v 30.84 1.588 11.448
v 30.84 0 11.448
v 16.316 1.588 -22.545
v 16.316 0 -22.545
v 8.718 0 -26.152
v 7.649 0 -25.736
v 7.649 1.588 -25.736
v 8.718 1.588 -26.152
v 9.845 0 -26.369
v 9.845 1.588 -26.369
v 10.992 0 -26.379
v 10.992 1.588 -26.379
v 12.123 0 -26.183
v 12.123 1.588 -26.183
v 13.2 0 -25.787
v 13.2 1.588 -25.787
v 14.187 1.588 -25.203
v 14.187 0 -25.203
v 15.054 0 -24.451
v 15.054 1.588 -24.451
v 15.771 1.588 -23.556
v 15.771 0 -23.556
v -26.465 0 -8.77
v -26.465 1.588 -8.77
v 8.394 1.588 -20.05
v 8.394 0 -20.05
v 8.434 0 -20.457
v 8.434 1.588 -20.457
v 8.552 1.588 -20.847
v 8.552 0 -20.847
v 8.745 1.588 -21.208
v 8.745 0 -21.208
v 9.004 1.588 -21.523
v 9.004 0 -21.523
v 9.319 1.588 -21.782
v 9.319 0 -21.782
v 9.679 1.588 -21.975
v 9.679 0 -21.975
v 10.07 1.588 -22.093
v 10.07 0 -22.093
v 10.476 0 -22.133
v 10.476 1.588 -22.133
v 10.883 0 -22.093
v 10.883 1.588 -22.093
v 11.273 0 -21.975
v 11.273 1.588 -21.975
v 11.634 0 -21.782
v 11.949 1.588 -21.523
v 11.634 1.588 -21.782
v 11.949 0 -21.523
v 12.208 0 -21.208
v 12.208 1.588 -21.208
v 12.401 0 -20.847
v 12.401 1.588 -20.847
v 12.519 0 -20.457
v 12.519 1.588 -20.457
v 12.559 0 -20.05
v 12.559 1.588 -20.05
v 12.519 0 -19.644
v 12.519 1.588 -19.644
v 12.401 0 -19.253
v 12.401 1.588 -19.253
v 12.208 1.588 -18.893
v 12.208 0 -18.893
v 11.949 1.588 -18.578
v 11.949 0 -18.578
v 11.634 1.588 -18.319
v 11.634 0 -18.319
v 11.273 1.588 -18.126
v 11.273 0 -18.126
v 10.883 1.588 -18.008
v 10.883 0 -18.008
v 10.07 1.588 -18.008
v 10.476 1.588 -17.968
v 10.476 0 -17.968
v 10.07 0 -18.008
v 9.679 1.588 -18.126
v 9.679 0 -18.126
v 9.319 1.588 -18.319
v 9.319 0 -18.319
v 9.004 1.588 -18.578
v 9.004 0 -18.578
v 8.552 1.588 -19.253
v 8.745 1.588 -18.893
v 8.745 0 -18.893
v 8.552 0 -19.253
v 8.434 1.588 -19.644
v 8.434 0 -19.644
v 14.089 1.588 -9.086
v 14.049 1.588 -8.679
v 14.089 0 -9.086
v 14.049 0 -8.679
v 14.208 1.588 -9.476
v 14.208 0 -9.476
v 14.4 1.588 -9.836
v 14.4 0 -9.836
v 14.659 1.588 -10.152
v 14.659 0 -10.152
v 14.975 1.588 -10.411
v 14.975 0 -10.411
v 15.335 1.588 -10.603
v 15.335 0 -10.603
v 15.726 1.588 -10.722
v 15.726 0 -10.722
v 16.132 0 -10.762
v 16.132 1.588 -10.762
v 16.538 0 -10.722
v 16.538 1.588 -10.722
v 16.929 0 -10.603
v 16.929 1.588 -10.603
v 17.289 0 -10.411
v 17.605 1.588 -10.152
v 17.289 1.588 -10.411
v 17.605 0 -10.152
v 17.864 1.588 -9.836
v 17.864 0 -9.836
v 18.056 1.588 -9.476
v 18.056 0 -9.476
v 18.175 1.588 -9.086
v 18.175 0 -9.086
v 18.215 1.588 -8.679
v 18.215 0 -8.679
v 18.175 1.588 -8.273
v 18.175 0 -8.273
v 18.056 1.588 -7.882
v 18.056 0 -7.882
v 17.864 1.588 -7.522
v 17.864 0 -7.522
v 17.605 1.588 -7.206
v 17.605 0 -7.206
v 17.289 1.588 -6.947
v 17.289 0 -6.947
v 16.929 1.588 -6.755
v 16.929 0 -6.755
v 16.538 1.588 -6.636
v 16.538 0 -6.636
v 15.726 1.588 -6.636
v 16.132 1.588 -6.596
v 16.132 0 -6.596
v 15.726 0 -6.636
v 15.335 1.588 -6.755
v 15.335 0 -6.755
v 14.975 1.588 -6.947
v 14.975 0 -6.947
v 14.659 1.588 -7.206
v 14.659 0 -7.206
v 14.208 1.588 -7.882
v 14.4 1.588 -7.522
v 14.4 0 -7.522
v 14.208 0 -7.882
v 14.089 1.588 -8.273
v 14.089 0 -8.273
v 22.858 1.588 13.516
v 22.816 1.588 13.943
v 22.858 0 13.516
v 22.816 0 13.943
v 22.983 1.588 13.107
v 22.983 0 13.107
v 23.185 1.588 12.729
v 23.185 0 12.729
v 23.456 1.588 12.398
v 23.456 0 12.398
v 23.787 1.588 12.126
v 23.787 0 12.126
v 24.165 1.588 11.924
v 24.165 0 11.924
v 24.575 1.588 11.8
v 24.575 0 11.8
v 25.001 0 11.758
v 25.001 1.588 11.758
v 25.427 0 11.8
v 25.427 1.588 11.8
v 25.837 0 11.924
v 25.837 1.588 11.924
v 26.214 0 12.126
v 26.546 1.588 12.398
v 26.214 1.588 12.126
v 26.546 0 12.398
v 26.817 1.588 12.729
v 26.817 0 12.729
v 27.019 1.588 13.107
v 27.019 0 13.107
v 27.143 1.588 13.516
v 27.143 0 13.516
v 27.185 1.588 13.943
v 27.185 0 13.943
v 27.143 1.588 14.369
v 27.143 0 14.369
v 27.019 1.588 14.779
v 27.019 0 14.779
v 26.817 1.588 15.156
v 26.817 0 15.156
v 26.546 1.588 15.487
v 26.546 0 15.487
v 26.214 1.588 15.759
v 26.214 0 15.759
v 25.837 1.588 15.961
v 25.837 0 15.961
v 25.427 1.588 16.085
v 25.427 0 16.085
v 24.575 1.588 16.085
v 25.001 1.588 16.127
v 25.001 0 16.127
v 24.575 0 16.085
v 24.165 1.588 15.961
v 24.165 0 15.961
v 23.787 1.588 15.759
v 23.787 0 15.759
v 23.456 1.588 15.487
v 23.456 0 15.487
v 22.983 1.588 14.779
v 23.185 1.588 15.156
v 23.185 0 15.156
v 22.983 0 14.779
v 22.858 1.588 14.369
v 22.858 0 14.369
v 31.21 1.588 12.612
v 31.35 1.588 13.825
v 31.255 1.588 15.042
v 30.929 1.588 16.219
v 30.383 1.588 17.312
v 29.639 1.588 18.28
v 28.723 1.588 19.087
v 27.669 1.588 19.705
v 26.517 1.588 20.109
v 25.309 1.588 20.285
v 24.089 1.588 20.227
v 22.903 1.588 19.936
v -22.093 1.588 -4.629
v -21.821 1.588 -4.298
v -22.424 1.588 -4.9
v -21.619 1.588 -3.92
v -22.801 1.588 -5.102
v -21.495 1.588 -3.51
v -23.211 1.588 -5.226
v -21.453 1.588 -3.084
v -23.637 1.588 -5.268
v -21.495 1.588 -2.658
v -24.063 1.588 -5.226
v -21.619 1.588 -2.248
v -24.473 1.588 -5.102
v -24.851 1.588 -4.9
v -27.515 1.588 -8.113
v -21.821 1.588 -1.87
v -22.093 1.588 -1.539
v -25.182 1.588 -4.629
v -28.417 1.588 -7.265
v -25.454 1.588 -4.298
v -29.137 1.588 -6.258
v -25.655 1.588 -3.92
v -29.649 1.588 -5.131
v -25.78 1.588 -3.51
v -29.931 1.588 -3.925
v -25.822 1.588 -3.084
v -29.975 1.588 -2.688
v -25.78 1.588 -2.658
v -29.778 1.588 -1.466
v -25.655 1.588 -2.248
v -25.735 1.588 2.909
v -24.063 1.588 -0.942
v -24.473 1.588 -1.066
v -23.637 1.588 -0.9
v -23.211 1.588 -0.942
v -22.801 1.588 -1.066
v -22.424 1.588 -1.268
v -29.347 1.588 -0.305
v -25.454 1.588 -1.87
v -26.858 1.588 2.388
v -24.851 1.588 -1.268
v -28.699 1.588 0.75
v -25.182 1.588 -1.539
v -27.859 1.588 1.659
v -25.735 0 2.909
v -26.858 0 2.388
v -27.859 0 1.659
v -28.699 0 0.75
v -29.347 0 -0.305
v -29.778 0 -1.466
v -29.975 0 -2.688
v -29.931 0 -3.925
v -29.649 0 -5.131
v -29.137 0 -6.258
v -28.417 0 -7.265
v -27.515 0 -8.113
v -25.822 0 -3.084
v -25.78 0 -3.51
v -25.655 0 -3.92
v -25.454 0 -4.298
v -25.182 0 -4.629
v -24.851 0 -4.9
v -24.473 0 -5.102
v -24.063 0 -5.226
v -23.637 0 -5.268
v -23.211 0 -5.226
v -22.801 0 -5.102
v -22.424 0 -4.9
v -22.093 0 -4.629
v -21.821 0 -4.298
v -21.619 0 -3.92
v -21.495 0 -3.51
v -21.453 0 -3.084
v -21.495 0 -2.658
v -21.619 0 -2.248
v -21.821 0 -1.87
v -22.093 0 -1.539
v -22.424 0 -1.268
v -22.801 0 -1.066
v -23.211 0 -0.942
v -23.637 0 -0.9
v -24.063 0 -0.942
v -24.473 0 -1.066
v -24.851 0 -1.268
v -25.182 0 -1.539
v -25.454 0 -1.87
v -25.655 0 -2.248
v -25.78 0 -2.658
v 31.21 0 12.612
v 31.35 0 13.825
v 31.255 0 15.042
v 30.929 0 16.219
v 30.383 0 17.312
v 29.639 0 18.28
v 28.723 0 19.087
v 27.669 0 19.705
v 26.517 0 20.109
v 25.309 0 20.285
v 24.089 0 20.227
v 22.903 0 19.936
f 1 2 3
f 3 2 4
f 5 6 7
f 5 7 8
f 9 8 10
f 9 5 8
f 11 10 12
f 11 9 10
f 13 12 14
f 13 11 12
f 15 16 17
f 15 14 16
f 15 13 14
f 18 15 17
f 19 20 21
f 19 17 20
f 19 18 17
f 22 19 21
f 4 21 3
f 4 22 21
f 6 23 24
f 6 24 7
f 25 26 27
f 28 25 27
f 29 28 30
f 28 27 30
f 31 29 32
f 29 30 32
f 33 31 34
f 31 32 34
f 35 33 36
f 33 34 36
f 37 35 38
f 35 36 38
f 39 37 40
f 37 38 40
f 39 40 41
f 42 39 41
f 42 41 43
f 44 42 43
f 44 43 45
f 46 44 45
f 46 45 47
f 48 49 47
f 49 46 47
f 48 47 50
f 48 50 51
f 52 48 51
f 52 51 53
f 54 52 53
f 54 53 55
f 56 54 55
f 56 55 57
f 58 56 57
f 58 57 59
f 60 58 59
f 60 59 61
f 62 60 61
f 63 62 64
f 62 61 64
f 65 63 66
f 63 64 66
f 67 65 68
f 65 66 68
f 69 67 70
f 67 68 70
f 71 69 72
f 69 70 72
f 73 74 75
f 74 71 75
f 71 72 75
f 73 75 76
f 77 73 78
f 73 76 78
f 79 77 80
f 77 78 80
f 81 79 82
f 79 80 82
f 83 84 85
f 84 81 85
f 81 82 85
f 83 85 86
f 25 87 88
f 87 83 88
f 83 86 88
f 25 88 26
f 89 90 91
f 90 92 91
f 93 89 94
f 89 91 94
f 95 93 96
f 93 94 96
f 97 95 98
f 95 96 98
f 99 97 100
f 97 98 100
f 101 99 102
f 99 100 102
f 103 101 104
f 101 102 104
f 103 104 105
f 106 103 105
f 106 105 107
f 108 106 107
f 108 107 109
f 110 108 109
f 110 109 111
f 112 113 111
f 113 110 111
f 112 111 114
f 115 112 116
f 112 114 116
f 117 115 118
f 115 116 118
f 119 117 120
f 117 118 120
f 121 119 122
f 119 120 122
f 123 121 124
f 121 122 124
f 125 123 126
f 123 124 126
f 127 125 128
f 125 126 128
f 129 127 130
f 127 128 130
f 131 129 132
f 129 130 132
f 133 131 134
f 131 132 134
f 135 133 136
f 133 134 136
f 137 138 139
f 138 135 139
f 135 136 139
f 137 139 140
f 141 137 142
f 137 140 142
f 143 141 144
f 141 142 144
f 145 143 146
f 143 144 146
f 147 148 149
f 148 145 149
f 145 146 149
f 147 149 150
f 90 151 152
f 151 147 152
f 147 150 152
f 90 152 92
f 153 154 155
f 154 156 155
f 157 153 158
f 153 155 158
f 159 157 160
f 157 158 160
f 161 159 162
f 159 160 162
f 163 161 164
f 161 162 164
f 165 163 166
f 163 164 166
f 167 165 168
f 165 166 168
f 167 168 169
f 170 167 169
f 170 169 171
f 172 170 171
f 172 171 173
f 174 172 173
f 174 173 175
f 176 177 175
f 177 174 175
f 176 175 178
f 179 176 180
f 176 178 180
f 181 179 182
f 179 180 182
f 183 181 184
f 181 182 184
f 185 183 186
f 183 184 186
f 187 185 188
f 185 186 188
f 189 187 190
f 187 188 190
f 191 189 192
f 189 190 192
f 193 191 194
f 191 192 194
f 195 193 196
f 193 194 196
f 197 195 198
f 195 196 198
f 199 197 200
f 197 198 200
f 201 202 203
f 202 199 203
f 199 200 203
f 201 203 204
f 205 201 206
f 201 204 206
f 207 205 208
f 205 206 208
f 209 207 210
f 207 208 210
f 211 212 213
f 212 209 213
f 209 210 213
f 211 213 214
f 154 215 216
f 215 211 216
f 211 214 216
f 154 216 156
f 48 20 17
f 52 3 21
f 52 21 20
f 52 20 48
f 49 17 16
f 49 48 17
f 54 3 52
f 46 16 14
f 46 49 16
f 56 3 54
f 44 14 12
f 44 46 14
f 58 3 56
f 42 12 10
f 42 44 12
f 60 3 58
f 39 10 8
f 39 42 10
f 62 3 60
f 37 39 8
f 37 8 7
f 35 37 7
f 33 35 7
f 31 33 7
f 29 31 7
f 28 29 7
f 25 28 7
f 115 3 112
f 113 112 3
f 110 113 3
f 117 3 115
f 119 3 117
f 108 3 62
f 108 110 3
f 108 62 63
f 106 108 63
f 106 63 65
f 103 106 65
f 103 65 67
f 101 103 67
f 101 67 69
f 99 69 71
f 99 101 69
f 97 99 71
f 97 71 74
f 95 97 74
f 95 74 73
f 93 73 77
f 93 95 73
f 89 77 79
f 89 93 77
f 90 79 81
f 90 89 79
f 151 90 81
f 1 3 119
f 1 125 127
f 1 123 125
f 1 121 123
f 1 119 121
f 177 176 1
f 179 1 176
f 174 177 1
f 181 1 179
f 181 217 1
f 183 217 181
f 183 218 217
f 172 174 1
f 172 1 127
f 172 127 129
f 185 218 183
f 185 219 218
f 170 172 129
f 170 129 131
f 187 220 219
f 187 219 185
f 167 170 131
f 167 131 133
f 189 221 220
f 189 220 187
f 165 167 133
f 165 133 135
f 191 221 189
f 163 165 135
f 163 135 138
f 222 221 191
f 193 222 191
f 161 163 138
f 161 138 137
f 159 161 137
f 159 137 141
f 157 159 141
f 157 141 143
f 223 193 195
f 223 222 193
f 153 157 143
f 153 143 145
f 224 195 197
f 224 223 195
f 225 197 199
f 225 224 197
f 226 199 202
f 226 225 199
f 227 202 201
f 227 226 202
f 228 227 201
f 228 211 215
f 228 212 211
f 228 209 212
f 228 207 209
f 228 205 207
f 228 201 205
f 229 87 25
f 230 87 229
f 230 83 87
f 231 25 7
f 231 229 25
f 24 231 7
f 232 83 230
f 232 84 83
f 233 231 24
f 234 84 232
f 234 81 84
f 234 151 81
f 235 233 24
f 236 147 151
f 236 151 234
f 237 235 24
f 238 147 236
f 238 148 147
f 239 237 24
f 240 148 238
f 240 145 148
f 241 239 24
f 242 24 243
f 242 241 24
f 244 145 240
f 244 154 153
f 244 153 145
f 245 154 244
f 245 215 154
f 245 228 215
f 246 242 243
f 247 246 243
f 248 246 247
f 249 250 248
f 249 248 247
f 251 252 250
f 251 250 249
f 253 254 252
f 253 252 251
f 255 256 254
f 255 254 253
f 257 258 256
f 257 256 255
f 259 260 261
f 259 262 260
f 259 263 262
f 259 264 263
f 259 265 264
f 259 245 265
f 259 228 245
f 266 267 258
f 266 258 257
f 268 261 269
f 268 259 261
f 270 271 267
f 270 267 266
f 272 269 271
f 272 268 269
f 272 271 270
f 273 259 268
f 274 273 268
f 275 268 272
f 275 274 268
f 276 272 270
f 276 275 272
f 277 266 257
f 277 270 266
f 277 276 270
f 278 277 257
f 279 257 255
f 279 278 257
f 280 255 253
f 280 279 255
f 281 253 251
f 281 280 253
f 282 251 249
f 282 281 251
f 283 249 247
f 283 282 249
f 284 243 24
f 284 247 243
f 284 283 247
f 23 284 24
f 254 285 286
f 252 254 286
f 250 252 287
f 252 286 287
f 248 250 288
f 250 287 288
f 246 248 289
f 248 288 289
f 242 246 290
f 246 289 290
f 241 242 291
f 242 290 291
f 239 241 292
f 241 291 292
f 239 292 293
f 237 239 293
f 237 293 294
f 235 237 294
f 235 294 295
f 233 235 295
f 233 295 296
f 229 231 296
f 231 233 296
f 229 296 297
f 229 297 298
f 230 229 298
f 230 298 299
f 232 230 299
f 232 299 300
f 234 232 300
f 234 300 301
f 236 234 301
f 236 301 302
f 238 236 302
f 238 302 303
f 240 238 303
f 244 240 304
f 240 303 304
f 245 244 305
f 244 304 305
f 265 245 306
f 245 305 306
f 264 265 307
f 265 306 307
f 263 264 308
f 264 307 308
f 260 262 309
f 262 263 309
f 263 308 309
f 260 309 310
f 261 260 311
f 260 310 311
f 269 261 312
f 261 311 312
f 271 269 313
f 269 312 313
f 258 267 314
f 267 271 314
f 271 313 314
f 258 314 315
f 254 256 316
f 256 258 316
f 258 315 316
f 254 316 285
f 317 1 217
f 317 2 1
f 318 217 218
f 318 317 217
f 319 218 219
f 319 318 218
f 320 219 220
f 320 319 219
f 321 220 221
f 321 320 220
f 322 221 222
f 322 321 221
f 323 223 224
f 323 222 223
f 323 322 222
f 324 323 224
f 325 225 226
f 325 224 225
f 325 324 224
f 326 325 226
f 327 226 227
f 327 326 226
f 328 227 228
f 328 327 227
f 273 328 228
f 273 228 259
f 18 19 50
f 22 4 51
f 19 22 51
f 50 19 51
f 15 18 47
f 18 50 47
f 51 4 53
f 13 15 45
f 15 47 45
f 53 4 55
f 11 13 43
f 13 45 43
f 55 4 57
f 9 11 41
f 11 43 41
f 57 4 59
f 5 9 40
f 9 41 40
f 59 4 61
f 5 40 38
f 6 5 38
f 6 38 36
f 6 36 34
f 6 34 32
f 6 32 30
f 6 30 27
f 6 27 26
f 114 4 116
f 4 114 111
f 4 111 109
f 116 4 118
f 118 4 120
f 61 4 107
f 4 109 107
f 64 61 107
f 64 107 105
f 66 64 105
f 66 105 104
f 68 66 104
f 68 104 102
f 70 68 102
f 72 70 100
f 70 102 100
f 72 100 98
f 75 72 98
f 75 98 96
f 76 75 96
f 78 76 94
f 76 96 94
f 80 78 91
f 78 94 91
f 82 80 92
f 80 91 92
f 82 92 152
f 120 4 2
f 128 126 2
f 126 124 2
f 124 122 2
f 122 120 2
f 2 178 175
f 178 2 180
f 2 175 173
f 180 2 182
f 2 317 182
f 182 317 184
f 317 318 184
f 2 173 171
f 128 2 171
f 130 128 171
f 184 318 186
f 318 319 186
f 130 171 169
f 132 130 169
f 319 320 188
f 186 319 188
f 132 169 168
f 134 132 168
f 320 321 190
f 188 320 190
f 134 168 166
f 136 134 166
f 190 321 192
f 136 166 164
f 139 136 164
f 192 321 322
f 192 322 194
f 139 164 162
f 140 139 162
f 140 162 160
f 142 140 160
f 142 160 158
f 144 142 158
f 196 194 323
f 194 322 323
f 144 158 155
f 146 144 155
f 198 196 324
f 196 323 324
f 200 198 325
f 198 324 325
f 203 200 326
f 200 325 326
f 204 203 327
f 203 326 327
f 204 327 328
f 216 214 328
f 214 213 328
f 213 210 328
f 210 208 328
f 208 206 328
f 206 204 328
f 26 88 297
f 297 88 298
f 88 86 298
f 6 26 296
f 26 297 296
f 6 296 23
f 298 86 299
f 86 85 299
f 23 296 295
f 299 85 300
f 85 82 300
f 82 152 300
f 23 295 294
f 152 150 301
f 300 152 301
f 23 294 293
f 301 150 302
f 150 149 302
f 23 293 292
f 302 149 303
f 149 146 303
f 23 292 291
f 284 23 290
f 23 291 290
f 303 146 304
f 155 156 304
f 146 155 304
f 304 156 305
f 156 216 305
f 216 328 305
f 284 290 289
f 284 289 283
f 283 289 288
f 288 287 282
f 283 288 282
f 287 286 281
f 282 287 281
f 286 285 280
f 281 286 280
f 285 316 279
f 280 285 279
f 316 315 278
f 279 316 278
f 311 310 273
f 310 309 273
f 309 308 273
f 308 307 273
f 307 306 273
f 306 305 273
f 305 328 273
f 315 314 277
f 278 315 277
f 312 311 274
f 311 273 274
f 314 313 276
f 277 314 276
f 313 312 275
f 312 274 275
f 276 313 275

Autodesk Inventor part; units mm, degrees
ref_plane "YZ Plane" through (0, 0, 0) normal (1, 0, 0) x (0, 1, 0)
ref_plane "XZ Plane" through (0, 0, 0) normal (0, 1, 0) x (-1, 0, 0)
ref_plane "XY Plane" through (0, 0, 0) normal (0, 0, 1) x (1, 0, 0)
sketch "Sketch1" plane through (0, 0, 0) normal (0, 1, 0) x (-1, 0, 0)
  circle A0 centre (-25.0009, 13.9426) radius 2.1844
  circle A1 centre (-10.4764, -20.0504) radius 2.0828
  circle A2 centre (-16.132, -8.6792) radius 2.0828
  circle A3 centre (23.6373, -3.084) radius 2.1844
  arc A4 (-22.9029, 19.936) -> (-30.8402, 11.4476) centre (-25.0009, 13.9426) ccw
  arc A5 (-16.3157, -22.5454) -> (-7.6487, -25.736) centre (-10.4764, -20.0504) ccw
  arc A6 (26.4651, -8.7697) -> (25.7354, 2.9094) centre (23.6373, -3.084) ccw
  line L0 (-30.8402, 11.4476) -> (-16.3157, -22.5454)
  line L1 (-22.9029, 19.936) -> (25.7354, 2.9094)
  line L2 (26.4651, -8.7697) -> (-7.6487, -25.736)
  point P0 (0, 0)
extrude "Extrusion1" add sketch "Sketch1" along normal blind 1.5875
properties part number "newstackpoly"
